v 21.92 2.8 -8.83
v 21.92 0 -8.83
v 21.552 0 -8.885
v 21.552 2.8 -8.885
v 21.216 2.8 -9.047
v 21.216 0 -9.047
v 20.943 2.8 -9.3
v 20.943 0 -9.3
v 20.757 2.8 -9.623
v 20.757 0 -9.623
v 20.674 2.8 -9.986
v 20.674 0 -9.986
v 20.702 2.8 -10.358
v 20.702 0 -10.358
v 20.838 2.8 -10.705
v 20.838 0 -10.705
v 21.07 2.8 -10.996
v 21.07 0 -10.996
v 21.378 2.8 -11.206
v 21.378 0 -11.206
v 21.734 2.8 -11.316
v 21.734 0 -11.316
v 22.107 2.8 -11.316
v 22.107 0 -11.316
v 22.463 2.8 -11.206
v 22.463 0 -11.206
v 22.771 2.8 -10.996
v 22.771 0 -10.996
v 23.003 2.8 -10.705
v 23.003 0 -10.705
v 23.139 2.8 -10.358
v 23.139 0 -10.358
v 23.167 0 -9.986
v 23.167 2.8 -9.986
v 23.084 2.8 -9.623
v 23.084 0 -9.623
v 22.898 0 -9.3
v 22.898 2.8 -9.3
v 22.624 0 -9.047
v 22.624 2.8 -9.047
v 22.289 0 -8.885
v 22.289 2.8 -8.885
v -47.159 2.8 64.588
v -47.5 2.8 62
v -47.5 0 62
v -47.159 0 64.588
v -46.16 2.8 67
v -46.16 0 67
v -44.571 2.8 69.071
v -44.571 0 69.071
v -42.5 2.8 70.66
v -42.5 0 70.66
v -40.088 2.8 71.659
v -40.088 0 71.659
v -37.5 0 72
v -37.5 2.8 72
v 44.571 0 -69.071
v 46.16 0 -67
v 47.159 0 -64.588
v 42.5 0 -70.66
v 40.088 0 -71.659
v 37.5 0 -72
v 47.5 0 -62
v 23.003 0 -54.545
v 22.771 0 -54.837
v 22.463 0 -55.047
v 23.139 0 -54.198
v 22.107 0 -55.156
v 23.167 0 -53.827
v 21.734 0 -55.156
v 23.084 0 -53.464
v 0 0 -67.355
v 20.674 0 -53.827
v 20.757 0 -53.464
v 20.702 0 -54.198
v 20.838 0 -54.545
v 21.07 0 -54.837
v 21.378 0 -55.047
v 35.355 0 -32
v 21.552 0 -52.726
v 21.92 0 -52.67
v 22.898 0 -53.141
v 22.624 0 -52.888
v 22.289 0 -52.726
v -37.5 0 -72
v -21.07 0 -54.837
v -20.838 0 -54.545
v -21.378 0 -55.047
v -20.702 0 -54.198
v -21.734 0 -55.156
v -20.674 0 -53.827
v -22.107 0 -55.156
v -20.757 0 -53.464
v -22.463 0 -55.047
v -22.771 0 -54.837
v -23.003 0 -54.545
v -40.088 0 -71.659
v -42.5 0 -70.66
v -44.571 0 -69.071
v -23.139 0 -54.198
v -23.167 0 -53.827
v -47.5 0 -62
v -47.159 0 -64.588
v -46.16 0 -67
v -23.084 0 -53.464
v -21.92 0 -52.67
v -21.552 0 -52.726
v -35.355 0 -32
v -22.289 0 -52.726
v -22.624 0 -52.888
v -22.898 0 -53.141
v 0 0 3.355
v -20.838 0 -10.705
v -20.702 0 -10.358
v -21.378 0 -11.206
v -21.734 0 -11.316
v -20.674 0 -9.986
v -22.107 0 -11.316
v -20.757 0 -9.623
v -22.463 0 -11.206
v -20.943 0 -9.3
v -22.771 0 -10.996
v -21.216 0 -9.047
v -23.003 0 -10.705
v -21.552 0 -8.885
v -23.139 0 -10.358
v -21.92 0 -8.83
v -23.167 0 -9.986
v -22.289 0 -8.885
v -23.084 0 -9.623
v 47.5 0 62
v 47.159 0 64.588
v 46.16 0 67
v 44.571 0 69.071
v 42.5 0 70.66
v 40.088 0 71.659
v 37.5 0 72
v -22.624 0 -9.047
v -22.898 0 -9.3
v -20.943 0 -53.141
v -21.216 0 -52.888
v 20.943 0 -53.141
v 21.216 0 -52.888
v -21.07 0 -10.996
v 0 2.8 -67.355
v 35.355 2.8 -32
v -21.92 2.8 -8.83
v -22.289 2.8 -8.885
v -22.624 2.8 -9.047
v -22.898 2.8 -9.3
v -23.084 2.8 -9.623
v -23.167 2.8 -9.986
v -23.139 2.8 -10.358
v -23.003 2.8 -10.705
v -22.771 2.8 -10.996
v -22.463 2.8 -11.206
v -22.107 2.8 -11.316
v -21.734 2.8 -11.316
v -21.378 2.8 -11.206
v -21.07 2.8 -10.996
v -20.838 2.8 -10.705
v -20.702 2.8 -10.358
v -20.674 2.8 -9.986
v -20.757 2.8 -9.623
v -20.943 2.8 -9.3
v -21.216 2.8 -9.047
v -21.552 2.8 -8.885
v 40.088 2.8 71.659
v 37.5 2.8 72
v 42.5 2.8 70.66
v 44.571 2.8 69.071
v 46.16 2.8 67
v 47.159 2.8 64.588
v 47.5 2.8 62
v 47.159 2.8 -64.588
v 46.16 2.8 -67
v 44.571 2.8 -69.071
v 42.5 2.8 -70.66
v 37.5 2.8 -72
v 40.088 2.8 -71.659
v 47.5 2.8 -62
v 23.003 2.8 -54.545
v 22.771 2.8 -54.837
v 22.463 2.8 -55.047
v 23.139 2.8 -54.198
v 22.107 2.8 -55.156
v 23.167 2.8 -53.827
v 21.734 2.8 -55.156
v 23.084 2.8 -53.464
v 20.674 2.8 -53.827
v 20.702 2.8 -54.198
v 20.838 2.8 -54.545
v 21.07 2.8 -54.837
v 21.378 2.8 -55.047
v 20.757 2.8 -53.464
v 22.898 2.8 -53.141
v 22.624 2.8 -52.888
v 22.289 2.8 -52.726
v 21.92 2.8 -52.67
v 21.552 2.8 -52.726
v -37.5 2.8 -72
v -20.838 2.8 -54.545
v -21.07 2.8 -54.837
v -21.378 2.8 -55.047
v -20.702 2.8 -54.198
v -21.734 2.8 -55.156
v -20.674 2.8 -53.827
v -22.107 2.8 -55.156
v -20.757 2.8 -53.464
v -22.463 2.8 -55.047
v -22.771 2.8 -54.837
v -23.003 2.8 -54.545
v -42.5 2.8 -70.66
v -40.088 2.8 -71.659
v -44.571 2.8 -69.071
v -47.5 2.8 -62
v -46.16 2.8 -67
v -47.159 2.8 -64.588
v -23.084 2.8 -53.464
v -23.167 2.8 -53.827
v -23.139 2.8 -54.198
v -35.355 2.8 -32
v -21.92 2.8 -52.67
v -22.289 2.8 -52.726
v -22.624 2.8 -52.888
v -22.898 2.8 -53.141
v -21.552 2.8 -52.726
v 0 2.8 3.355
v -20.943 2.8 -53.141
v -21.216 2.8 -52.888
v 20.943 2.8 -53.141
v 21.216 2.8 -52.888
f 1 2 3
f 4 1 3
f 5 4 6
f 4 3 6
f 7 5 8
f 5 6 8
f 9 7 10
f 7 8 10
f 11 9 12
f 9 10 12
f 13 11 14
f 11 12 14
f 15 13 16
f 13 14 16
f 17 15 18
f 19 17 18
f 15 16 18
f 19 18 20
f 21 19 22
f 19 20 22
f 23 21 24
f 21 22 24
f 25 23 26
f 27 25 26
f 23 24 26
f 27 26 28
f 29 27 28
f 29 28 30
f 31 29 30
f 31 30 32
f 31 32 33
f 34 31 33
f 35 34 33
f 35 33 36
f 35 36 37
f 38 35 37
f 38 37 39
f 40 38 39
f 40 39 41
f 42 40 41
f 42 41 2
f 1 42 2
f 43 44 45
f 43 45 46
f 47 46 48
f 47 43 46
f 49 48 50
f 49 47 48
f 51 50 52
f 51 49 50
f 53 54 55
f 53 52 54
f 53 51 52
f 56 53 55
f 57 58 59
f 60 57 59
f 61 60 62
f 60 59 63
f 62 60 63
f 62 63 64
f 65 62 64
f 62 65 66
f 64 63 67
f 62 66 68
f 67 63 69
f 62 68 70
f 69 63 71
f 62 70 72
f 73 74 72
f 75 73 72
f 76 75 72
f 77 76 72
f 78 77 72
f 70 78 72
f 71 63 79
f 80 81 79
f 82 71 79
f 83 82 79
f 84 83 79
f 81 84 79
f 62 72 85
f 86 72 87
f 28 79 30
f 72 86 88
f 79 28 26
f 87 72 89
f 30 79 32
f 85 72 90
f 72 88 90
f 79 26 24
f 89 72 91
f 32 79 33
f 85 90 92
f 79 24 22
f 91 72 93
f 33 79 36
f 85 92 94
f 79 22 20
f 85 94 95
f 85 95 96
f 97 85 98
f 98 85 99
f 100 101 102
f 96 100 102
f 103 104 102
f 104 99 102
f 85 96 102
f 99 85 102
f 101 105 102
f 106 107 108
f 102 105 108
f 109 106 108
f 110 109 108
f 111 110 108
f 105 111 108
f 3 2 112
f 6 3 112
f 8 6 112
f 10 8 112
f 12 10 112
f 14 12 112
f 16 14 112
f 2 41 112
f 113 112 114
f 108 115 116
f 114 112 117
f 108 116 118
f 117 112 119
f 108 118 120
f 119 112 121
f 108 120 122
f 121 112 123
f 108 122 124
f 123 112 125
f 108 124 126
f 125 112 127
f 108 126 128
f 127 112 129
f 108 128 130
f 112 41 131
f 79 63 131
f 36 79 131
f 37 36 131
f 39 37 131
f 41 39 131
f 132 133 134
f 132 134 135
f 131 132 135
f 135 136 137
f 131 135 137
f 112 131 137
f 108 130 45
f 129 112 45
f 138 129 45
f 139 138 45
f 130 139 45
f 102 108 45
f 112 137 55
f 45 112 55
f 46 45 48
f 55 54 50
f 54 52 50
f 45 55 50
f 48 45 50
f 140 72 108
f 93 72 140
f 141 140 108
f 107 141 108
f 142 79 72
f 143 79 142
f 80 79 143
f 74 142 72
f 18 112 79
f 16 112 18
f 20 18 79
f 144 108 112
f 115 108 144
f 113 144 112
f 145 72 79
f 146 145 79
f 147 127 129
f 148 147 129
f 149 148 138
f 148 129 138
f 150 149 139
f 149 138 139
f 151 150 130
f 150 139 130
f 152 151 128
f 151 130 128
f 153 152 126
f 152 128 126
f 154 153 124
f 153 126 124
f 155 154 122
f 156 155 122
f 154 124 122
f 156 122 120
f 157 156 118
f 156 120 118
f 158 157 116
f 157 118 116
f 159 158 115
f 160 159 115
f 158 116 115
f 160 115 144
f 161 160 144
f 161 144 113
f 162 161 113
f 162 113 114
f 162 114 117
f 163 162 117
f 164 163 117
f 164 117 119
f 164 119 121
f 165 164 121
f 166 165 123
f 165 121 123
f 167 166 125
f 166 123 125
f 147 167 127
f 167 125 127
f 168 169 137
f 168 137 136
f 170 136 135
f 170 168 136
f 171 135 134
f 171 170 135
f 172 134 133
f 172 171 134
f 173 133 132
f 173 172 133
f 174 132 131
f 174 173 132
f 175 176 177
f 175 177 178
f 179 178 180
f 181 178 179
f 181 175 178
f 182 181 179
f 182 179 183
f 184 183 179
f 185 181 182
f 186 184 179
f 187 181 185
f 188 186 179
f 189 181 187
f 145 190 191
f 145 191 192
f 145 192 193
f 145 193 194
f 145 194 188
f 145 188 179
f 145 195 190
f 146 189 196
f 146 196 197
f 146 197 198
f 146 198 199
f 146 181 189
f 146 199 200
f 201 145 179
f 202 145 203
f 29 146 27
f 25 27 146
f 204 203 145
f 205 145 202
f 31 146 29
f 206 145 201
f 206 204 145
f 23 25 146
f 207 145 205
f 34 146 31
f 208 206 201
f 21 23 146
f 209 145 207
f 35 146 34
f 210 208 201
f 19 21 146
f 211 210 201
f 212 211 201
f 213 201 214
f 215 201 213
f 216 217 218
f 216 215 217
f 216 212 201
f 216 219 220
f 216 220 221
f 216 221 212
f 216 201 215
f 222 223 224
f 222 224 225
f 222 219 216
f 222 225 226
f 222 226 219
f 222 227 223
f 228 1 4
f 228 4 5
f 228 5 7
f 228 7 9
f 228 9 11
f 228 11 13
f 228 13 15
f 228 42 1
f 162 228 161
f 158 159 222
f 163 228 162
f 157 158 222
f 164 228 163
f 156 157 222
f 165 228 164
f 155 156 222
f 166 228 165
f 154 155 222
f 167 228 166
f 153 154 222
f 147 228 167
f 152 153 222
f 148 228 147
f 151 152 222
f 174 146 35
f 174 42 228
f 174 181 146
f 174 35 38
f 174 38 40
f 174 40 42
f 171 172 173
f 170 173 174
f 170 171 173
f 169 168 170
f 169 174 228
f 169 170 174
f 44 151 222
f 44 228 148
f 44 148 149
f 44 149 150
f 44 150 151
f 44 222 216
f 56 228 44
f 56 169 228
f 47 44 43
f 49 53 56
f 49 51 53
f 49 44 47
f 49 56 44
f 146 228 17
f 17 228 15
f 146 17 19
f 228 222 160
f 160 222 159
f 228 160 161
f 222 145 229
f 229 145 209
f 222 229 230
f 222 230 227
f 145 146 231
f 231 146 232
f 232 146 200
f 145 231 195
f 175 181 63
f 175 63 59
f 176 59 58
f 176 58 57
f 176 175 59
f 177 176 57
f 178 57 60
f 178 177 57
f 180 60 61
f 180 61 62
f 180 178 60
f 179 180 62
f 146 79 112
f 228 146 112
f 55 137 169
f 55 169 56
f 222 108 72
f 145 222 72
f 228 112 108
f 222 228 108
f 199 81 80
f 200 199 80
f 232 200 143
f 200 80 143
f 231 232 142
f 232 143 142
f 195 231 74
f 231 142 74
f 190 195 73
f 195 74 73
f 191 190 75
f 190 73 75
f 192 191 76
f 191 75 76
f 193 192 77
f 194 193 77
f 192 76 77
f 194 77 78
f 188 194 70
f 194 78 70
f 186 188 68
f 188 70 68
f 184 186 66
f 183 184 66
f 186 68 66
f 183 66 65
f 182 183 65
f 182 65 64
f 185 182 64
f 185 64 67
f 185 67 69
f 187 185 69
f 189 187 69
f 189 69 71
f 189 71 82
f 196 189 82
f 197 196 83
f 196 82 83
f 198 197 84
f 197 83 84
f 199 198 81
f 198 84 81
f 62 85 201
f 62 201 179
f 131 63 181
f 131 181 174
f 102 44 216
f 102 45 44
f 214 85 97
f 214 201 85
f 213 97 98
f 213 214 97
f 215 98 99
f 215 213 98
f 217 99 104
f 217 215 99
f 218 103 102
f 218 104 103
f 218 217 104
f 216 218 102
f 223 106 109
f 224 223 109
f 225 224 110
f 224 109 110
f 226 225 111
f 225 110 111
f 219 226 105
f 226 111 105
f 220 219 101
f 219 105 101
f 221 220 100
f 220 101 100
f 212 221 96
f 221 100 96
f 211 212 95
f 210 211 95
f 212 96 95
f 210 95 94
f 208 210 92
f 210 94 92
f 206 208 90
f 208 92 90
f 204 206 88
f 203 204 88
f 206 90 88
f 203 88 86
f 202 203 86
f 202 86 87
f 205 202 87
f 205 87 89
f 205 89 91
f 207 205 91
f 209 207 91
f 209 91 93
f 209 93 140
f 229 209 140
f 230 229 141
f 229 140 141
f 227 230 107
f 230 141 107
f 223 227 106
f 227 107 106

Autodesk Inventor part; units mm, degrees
ref_plane "YZ Plane" through (0, 0, 0) normal (1, 0, 0) x (0, 1, 0)
ref_plane "XZ Plane" through (0, 0, 0) normal (0, 1, 0) x (-1, 0, 0)
ref_plane "XY Plane" through (0, 0, 0) normal (0, 0, 1) x (1, 0, 0)
sketch "Sketch1" plane through (0, 0, 0) normal (0, 1, 0) x (-1, 0, 0)
  line L0 (-47.5, 72) -> (47.5, 72)
  line L1 (47.5, 72) -> (47.5, -72)
  line L2 (47.5, -72) -> (-47.5, -72)
  line L3 (-47.5, -72) -> (-47.5, 72)
  line L4 (-47.5, 72) -> (47.5, -72) construction
  line L5 (47.5, 72) -> (-47.5, -72) construction
  line L6 (0, 3.3553) -> (35.3553, -32)
  line L7 (35.3553, -32) -> (0, -67.3553)
  line L8 (0, -67.3553) -> (-35.3553, -32)
  line L9 (-35.3553, -32) -> (0, 3.3553)
  line L10 (0, 3.3553) -> (0, -67.3553) construction
  line L11 (35.3553, -32) -> (-35.3553, -32) construction
  point P0 (0, 0)
  point P1 (0, -32)
  point P2 (0, -32)
  point P3 (0, 0)
  dimension "d0" = 95
  dimension "d1" = 144
  dimension "d2" = 50
  dimension "d3" = 40
extrude "Extrusion1" add sketch "Sketch1" along normal blind 2.8
sketch "Sketch2" plane through (0, 2.8, 0) normal (0, 1, 0) x (1, 0, 0)
  line L0 (-35.3553, 32) -> (0, 67.3553) construction
  line L1 (0, 67.3553) -> (35.3553, 32) construction
  line L2 (35.3553, 32) -> (0, -3.3553) construction
  line L3 (0, -3.3553) -> (-35.3553, 32) construction
  line L4 (0, 75.8406) -> (-43.8406, 32)
  line L5 (-43.8406, 32) -> (0, -11.8406)
  line L6 (0, -11.8406) -> (43.8406, 32)
  line L7 (43.8406, 32) -> (0, 75.8406)
  point P0 (0, 0)
  point P1 (-21.9203, 53.9203)
  point P2 (21.9203, 53.9203)
  point P3 (21.9203, 10.0797)
  point P4 (-21.9203, 10.0797)
  dimension "d6" = 6
hole "Hole1" at (-21.9203, 2.8, -53.9203) at (21.9203, 2.8, -53.9203) at (21.9203, 2.8, -10.0797) at (-21.9203, 2.8, -10.0797) direction (0, -1, 0) diameter 2.5 end through all
fillet "Fillet1" radius 10 4 edges at (-47.5, 1.4, 72) (47.5, 1.4, 72) (47.5, 1.4, -72) (-47.5, 1.4, -72)
